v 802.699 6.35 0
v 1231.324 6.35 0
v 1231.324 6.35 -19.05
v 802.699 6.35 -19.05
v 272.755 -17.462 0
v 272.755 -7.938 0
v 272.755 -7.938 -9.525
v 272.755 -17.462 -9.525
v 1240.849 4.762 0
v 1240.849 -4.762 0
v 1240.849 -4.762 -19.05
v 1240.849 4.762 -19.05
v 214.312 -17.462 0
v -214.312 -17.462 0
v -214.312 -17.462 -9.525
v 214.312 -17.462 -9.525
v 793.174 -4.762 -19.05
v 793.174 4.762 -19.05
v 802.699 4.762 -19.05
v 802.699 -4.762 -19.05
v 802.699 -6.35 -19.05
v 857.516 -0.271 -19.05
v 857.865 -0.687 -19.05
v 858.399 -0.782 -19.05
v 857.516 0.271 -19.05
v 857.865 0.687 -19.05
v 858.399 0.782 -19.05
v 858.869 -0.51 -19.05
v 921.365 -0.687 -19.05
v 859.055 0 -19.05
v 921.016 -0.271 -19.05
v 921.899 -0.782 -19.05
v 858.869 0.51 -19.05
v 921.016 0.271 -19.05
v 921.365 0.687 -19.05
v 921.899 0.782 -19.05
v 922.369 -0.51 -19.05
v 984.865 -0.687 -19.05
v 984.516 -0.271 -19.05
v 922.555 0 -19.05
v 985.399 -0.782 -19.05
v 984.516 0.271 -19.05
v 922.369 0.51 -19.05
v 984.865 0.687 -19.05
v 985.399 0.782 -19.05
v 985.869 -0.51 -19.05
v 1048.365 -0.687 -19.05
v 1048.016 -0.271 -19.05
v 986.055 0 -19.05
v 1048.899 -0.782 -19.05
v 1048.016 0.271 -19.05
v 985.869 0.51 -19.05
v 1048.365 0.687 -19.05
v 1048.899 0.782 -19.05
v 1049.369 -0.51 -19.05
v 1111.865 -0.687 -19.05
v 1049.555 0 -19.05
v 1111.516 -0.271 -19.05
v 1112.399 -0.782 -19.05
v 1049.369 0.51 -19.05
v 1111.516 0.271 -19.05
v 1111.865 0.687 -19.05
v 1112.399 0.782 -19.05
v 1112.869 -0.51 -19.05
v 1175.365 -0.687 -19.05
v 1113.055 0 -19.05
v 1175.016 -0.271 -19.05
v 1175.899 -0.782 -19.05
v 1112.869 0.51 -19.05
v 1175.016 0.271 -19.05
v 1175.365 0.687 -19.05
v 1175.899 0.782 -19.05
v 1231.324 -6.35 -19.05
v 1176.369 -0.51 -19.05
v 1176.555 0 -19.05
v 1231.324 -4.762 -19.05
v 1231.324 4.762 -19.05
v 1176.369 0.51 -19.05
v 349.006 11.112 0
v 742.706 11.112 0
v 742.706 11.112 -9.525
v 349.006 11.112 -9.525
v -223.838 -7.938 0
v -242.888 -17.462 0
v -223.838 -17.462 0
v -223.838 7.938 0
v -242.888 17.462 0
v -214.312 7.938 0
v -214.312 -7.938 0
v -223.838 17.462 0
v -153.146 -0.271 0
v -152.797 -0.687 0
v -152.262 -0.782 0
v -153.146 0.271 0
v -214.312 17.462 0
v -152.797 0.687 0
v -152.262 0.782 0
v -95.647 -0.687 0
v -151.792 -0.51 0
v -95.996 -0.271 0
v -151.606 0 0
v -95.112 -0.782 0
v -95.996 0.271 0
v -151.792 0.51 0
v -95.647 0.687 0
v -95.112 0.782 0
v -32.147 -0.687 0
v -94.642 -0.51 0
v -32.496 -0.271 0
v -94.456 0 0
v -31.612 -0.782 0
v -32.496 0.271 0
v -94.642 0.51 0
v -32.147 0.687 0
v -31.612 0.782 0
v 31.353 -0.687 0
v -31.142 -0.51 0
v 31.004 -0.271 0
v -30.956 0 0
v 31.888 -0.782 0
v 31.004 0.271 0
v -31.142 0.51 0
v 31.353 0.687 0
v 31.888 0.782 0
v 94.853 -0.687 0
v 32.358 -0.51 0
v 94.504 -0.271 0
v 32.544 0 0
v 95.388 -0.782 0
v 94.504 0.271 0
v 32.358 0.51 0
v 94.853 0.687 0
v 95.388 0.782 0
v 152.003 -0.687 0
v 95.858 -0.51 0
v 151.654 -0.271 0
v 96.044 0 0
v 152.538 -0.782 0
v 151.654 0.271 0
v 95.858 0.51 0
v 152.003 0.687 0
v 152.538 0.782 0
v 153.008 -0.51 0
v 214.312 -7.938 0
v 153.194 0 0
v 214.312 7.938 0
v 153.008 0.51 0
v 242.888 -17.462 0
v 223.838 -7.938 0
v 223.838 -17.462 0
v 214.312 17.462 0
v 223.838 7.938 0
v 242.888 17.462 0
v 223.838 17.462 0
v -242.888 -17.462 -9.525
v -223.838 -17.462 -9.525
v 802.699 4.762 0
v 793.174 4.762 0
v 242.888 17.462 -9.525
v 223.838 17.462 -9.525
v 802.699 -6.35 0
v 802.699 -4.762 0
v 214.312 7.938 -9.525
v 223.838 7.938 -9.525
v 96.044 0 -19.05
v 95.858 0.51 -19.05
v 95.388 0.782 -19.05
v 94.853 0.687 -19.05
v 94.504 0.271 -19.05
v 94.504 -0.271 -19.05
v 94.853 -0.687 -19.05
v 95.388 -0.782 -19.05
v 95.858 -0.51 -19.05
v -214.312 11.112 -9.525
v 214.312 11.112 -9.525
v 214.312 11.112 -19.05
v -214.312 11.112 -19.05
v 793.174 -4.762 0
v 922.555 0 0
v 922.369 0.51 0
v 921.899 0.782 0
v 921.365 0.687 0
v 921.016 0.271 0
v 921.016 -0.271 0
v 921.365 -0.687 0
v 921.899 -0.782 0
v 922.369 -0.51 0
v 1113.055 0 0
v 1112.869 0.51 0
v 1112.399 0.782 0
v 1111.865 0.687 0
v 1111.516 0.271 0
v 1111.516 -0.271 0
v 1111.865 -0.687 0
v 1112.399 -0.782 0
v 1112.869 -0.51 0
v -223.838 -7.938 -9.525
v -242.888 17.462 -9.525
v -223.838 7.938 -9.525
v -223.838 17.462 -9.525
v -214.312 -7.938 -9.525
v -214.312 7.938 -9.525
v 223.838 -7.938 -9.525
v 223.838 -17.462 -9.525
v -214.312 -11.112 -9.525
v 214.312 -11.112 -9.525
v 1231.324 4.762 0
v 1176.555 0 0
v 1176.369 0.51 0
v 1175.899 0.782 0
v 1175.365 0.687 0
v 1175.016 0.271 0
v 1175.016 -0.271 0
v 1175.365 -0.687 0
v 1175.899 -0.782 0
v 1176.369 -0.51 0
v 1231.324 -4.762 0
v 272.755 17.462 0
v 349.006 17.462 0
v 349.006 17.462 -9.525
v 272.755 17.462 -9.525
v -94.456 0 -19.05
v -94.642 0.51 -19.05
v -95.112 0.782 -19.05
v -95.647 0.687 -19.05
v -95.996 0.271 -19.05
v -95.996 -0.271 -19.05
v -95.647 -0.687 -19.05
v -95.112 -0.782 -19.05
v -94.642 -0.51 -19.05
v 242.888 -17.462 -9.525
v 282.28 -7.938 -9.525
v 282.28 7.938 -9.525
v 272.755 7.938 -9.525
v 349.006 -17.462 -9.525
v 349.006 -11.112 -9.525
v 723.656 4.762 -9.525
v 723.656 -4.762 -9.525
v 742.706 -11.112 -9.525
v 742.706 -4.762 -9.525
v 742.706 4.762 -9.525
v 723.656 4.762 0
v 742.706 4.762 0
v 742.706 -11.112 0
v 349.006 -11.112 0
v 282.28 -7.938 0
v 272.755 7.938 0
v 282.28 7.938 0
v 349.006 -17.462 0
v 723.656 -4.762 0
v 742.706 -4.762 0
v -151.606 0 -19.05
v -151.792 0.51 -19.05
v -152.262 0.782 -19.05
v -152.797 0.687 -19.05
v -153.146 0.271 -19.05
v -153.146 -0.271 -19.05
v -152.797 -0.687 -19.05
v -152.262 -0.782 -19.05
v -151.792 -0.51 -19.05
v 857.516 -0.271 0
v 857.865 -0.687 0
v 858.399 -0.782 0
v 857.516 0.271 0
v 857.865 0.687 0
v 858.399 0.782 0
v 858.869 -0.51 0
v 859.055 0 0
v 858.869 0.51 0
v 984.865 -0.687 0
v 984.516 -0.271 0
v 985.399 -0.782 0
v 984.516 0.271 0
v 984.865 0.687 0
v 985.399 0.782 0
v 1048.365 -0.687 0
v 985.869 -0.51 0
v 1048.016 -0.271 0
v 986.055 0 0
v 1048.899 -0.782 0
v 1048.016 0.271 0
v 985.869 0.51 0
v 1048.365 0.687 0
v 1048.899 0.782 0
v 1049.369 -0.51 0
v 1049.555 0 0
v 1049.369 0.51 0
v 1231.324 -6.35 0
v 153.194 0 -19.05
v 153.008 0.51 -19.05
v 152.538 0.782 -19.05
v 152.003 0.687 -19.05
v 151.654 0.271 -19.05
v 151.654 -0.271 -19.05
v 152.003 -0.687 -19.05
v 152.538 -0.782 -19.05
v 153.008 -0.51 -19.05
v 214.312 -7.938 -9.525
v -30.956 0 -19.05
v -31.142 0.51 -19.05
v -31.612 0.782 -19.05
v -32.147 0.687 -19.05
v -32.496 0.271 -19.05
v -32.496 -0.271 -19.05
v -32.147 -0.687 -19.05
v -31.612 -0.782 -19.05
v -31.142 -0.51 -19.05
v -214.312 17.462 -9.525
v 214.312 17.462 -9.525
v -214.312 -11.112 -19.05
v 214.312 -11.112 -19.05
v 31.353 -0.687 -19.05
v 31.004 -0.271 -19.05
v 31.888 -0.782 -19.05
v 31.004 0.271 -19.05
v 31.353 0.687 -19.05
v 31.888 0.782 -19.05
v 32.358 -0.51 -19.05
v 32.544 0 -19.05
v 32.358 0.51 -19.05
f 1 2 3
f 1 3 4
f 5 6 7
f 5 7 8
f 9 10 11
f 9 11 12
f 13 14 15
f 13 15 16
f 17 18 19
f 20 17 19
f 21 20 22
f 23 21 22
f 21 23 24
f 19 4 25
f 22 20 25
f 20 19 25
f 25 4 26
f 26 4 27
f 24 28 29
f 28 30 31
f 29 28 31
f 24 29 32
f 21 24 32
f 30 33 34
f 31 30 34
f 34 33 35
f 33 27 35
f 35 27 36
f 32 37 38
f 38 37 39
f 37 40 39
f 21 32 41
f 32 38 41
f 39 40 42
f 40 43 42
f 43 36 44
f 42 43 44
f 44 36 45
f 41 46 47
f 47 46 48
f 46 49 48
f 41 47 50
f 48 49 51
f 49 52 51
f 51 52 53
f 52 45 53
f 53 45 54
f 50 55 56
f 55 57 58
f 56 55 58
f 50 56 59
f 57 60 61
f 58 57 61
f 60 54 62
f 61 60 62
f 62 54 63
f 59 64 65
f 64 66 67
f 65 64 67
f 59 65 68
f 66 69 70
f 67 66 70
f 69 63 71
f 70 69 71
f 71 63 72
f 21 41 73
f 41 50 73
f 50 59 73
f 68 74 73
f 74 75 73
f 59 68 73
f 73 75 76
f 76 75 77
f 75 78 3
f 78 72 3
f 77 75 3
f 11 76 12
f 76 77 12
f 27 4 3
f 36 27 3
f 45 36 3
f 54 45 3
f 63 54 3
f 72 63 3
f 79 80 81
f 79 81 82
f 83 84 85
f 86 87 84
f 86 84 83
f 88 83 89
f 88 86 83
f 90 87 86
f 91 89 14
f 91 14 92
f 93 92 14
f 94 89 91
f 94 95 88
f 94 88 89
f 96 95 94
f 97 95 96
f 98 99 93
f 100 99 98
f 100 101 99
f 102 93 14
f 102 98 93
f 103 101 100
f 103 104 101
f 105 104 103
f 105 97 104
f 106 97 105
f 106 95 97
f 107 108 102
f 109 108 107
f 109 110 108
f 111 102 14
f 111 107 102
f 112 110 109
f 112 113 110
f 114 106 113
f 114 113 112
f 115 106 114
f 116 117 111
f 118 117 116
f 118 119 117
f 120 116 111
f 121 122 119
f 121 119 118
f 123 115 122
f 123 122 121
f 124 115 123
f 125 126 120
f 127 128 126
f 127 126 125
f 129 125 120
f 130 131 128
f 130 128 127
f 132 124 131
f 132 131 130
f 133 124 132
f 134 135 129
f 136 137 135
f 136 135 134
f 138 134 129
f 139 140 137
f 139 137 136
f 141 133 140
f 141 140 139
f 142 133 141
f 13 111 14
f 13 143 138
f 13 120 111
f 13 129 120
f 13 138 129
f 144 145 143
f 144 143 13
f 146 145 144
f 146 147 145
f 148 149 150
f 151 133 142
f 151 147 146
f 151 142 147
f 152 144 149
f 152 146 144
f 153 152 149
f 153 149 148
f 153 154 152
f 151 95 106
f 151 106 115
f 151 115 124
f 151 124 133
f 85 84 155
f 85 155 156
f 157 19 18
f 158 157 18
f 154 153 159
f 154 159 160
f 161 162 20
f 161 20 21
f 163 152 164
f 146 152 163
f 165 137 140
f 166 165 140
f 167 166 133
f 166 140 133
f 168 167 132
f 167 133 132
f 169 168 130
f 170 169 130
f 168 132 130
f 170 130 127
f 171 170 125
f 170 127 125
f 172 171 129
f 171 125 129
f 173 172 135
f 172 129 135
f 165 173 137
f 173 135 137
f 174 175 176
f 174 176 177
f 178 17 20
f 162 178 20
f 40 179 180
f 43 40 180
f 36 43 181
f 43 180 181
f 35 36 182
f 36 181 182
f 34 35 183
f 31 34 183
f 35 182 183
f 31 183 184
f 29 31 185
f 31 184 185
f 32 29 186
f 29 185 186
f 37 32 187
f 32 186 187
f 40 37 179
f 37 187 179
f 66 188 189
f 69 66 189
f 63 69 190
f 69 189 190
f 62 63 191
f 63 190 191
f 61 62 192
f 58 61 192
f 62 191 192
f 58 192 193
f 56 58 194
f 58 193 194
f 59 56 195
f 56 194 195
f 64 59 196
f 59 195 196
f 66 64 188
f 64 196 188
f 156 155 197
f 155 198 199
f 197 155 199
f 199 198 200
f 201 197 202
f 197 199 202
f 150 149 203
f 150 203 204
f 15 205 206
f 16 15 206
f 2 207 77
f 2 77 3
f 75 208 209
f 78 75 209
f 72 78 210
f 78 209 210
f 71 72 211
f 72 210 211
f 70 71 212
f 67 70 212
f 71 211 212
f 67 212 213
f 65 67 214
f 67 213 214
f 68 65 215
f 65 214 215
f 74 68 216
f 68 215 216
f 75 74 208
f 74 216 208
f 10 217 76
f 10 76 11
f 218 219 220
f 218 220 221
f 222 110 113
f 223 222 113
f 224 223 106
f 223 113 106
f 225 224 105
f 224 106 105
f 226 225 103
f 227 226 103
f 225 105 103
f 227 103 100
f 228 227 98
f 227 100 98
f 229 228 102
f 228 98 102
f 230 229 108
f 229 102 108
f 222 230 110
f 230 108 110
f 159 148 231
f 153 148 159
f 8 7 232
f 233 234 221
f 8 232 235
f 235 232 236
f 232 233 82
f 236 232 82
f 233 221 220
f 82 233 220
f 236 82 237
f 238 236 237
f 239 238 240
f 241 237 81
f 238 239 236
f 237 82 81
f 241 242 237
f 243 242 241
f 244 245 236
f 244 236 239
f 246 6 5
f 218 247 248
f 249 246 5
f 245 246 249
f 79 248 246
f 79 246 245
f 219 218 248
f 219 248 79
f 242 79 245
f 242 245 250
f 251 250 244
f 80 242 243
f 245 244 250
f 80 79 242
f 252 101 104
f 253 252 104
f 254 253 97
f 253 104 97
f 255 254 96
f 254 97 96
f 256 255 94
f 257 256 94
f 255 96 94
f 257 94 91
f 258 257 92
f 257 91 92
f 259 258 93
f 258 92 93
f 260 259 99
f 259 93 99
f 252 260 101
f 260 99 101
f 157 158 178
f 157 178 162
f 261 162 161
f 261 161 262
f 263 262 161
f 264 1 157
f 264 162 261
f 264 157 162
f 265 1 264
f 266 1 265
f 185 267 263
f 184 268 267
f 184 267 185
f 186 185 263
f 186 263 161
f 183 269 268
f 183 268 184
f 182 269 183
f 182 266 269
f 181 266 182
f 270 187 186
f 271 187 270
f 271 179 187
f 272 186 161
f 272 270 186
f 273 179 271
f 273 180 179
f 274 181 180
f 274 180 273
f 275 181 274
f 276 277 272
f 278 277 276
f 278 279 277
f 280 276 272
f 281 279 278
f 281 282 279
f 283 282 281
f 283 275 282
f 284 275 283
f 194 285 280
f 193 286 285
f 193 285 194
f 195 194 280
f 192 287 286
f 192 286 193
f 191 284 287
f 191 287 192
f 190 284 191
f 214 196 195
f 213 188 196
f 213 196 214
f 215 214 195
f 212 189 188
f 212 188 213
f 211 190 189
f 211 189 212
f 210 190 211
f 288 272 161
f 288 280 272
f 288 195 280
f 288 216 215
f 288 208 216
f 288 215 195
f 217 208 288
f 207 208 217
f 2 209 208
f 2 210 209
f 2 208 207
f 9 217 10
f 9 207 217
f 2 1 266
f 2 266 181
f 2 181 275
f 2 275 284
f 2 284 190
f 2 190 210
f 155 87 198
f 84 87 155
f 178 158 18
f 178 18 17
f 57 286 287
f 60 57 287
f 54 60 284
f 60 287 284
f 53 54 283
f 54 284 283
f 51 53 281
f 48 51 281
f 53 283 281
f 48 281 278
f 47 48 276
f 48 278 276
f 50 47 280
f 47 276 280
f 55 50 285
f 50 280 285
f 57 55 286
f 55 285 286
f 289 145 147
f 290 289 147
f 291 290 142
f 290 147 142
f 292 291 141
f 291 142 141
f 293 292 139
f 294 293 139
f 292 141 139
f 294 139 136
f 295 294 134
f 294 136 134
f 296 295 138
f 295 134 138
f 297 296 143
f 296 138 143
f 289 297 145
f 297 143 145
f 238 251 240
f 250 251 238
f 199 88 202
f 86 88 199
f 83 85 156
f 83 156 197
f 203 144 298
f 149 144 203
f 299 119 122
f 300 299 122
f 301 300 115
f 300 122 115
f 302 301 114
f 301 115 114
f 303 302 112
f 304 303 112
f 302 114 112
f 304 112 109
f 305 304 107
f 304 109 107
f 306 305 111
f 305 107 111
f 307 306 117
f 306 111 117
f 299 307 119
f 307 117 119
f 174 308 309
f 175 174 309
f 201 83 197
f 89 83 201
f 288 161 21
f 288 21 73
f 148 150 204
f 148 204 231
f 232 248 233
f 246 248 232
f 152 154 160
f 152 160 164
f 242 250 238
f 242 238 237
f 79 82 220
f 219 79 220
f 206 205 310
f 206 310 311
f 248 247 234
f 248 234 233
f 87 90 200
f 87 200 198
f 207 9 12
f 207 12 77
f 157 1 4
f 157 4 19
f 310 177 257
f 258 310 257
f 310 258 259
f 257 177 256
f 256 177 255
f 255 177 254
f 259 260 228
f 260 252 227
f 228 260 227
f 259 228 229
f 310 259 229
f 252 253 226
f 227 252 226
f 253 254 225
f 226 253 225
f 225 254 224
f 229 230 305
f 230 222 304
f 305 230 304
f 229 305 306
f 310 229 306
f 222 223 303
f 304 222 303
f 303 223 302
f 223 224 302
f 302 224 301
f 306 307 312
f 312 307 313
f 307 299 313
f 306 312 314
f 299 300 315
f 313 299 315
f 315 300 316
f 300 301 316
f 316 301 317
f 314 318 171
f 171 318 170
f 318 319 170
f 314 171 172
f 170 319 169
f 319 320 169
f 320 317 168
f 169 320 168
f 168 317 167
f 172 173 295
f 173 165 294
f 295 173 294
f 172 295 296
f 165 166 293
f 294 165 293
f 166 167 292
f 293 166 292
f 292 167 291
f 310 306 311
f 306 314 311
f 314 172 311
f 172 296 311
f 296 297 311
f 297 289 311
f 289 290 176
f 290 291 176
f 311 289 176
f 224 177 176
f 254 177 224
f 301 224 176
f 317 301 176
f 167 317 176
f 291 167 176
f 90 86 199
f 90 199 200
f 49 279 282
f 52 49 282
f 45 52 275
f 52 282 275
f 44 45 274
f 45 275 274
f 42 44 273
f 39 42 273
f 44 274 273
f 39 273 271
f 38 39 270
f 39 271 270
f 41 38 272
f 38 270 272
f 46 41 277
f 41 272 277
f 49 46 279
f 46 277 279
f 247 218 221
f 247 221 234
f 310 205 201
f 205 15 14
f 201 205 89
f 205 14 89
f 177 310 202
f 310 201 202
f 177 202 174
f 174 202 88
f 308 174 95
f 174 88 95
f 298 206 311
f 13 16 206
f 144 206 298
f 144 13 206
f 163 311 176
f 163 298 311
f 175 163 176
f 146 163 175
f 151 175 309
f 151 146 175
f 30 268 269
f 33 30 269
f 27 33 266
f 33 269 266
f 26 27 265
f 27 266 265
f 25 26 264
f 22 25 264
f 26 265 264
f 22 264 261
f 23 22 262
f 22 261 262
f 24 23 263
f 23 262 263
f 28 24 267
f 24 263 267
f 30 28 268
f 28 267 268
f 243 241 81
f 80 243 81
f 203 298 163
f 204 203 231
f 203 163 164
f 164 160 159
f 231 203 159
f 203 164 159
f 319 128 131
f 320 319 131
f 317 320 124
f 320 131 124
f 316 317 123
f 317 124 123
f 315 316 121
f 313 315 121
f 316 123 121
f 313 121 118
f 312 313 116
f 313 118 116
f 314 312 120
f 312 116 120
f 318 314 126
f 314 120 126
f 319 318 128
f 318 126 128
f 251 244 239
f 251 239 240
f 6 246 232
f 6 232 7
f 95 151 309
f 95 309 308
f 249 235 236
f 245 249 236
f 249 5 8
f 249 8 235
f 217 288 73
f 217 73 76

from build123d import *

# Parameters (mm, degrees)
F0_R     = 0.79375
F1_DEPTH = 19.05
F0_W     = 214.3125
F0_H     = 6.35
F2_DEPTH = 9.525
F3_DEPTH = 9.525
F4_DEPTH = 19.05


with BuildPart() as f1:
    # F0 (on Top) → F1 (new body)
    with BuildSketch(Plane.XY):
        Polygon((0, -11.1125), (0, 0), (0, 11.1125), (-214.3125, 11.1125), (-214.3125, 7.9375), (-214.3125, 0), (-214.3125, -7.9375), (-214.3125, -11.1125), align=None)
        with Locations((-152.4, 0)):
            Circle(F0_R, mode=Mode.SUBTRACT)
        with Locations((-95.25, 0)):
            Circle(F0_R, mode=Mode.SUBTRACT)
        with Locations((-31.75, 0)):
            Circle(F0_R, mode=Mode.SUBTRACT)
        Polygon((0, 11.1125), (0, 0), (0, -11.1125), (214.3125, -11.1125), (214.3125, -7.9375), (214.3125, 0), (214.3125, 7.9375), (214.3125, 11.1125), align=None)
        with Locations((31.75, 0)):
            Circle(F0_R, mode=Mode.SUBTRACT)
        with Locations((95.25, 0)):
            Circle(F0_R, mode=Mode.SUBTRACT)
        with Locations((152.4, 0)):
            Circle(F0_R, mode=Mode.SUBTRACT)
    extrude(amount=-F1_DEPTH)

    # F0 (on Top) → F2 (join)
    with BuildSketch(Plane.XY):
        Polygon((-214.3125, 0), (-214.3125, 7.9375), (-223.8375, 7.9375), (-223.8375, 17.4625), (-242.8875, 17.4625), (-242.8875, 0), (-242.8875, -17.4625), (-223.8375, -17.4625), (-223.8375, -7.9375), (-214.3125, -7.9375), align=None)
        Polygon((223.8375, 7.9375), (214.3125, 7.9375), (214.3125, 0), (214.3125, -7.9375), (223.8375, -7.9375), (223.8375, -17.4625), (242.8875, -17.4625), (242.8875, 0), (242.8875, 17.4625), (223.8375, 17.4625), align=None)
        with Locations((107.15625, 14.2875)):
            Rectangle(F0_W, F0_H)
        with Locations((-107.15625, 14.2875)):
            Rectangle(F0_W, F0_H)
        with Locations((-107.15625, -14.2875)):
            Rectangle(F0_W, F0_H)
        with Locations((107.15625, -14.2875)):
            Rectangle(F0_W, F0_H)
    extrude(amount=-F2_DEPTH)


with BuildPart() as f3:
    # F0 (on Top) → F3 (new body)
    with BuildSketch(Plane.XY):
        Polygon((349.006027, 17.4625), (272.755325, 17.4625), (272.755325, 7.9375), (282.280325, 7.9375), (282.280325, -7.9375), (272.755325, -7.9375), (272.755325, -17.4625), (349.006027, -17.4625), (349.006027, -11.1125), (742.706027, -11.1125), (742.706027, -4.7625), (723.656027, -4.7625), (723.656027, 4.7625), (742.706027, 4.7625), (742.706027, 11.1125), (349.006027, 11.1125), align=None)
    extrude(amount=-F3_DEPTH)


with BuildPart() as f4:
    # F0 (on Top) → F4 (new body)
    with BuildSketch(Plane.XY):
        Polygon((793.173909, 4.7625), (793.173909, -4.7625), (802.698909, -4.7625), (802.698909, -6.35), (1231.323909, -6.35), (1231.323909, -4.7625), (1240.848909, -4.7625), (1240.848909, 4.7625), (1231.323909, 4.7625), (1231.323909, 6.35), (802.698909, 6.35), (802.698909, 4.7625), align=None)
        with Locations((858.261409, 0)):
            Circle(F0_R, mode=Mode.SUBTRACT)
        with Locations((921.761409, 0)):
            Circle(F0_R, mode=Mode.SUBTRACT)
        with Locations((985.261409, 0)):
            Circle(F0_R, mode=Mode.SUBTRACT)
        with Locations((1048.761409, 0)):
            Circle(F0_R, mode=Mode.SUBTRACT)
        with Locations((1112.261409, 0)):
            Circle(F0_R, mode=Mode.SUBTRACT)
        with Locations((1175.761409, 0)):
            Circle(F0_R, mode=Mode.SUBTRACT)
    extrude(amount=-F4_DEPTH)


solid = Compound([f1.part, f3.part, f4.part])
